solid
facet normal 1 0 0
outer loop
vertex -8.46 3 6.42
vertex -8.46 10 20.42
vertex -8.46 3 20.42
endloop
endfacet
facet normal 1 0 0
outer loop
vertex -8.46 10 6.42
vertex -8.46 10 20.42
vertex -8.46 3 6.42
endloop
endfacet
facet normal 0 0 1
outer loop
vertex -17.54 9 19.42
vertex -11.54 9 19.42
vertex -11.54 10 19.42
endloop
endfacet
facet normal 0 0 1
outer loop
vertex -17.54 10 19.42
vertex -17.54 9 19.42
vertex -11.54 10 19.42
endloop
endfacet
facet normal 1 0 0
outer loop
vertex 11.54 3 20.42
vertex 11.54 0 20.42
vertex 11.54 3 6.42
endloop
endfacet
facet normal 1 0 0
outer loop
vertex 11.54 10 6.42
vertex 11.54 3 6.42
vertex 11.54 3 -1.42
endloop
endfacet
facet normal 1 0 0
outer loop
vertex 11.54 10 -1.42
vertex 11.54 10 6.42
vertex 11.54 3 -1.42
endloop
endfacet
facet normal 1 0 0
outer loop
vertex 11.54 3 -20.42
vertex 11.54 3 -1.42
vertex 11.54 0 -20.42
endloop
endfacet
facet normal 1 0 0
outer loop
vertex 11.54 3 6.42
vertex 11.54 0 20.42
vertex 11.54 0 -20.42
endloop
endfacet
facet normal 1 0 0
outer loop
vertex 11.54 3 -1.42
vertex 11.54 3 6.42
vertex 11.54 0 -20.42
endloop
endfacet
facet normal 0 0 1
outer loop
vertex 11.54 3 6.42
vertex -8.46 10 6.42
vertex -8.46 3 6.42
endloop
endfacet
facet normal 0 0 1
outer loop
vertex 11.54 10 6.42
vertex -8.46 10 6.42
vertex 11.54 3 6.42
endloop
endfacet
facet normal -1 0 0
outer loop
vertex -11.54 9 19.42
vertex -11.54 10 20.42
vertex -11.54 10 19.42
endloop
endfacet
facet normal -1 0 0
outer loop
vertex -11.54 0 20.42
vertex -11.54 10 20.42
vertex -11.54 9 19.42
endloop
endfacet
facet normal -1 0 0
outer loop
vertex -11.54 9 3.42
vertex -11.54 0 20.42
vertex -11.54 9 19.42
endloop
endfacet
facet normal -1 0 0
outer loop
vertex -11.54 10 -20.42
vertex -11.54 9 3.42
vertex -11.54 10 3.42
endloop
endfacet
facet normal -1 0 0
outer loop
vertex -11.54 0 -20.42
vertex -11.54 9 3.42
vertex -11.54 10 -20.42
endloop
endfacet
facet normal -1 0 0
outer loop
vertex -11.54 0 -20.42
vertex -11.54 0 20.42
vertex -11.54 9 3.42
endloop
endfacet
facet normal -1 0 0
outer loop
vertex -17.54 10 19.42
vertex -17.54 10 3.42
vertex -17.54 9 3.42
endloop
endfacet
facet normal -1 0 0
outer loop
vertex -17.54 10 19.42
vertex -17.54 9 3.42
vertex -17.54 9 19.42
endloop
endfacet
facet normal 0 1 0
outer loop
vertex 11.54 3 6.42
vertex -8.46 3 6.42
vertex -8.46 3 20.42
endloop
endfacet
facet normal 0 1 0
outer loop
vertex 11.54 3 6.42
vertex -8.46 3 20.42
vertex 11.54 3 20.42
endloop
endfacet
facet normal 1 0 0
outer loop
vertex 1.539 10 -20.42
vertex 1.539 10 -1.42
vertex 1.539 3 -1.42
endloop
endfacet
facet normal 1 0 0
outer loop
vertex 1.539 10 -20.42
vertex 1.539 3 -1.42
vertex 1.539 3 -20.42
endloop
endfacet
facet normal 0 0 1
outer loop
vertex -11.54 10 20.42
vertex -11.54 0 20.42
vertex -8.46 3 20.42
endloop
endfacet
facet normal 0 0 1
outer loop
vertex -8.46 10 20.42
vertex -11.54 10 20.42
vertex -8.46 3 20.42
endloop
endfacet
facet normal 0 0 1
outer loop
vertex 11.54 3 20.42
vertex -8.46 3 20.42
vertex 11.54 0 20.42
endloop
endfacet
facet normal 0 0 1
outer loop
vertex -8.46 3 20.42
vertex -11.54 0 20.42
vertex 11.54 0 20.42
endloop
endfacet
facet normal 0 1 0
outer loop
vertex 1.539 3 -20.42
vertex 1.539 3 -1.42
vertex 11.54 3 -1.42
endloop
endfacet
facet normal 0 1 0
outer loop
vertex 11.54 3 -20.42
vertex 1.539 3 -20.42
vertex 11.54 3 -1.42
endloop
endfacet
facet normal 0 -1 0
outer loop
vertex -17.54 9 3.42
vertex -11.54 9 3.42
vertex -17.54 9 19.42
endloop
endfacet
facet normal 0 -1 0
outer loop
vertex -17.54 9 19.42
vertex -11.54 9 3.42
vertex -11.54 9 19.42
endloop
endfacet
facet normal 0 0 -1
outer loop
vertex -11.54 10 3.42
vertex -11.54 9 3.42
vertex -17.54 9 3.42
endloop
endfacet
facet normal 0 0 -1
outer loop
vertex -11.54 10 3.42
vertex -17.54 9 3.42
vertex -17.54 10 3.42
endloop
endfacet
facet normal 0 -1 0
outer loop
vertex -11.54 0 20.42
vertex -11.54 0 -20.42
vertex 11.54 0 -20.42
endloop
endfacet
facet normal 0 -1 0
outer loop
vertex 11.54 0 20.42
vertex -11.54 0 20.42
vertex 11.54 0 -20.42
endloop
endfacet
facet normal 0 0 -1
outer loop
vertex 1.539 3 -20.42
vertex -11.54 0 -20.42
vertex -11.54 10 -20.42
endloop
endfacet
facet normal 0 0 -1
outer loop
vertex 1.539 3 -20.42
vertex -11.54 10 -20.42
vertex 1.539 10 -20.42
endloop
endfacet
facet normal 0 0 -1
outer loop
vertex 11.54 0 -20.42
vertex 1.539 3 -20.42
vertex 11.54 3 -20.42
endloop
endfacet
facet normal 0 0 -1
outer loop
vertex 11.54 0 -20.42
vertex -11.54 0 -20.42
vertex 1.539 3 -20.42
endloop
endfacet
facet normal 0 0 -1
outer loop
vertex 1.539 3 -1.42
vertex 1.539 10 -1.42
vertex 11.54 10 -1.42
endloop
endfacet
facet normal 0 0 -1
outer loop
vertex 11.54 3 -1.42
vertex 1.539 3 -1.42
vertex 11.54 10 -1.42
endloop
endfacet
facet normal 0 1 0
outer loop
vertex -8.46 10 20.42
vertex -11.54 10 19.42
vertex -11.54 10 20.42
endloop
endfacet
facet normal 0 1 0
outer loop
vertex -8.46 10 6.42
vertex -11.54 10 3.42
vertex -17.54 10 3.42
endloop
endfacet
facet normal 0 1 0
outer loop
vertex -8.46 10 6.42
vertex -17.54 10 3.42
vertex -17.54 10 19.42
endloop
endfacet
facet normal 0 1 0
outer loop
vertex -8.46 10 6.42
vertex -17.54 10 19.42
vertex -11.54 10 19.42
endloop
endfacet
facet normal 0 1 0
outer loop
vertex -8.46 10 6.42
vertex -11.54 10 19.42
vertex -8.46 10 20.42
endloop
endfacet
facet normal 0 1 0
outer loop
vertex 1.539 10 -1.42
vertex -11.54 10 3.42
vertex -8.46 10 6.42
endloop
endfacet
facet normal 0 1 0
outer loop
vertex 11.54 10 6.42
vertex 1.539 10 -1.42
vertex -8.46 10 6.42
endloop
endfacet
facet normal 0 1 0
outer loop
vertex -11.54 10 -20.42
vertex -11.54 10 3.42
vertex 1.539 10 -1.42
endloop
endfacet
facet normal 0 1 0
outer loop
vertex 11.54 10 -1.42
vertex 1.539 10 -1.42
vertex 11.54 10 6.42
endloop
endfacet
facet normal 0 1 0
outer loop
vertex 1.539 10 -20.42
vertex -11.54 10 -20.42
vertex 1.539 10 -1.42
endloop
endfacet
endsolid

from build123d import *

# Parameters (mm, degrees)
MAINBODY_DWG_W  = 23.08
MAINBODY_DWG_H  = 40.84
MAIN_BODY_DEPTH = 10
PINS_DWG_W      = 16
PINS_DWG_H      = 1
PINS_DEPTH      = 6
RELIEF_DWG_W    = 10.001117723
RELIEF_DWG_H    = 19
RELIEF_DWG_W_2  = 20
RELIEF_DWG_H_2  = 14
RELIEF_DEPTH    = 7


with BuildPart() as part:
    # MAINBODY_DWG → MAIN_BODY (new body)
    with BuildSketch(Plane(origin=(0, 0, 0), x_dir=(1, 0, 0), z_dir=(0, 1, 0))):
        Rectangle(MAINBODY_DWG_W, MAINBODY_DWG_H)
    extrude(amount=MAIN_BODY_DEPTH)

    # PINS_DWG → PINS (add)
    with BuildSketch(Plane.ZY.offset(11.54)):
        with Locations((11.42, 9.5)):
            Rectangle(PINS_DWG_W, PINS_DWG_H)
    extrude(amount=PINS_DEPTH)

    # RELIEF_DWG → RELIEF (cut)
    with BuildSketch(Plane(origin=(0, 10, 0), x_dir=(1, 0, 0), z_dir=(0, 1, 0))):
        with Locations((6.539441139, 10.92)):
            Rectangle(RELIEF_DWG_W, RELIEF_DWG_H)
        with Locations((1.54, -13.42)):
            Rectangle(RELIEF_DWG_W_2, RELIEF_DWG_H_2)
    extrude(amount=-RELIEF_DEPTH, mode=Mode.SUBTRACT)


solid = part.part
